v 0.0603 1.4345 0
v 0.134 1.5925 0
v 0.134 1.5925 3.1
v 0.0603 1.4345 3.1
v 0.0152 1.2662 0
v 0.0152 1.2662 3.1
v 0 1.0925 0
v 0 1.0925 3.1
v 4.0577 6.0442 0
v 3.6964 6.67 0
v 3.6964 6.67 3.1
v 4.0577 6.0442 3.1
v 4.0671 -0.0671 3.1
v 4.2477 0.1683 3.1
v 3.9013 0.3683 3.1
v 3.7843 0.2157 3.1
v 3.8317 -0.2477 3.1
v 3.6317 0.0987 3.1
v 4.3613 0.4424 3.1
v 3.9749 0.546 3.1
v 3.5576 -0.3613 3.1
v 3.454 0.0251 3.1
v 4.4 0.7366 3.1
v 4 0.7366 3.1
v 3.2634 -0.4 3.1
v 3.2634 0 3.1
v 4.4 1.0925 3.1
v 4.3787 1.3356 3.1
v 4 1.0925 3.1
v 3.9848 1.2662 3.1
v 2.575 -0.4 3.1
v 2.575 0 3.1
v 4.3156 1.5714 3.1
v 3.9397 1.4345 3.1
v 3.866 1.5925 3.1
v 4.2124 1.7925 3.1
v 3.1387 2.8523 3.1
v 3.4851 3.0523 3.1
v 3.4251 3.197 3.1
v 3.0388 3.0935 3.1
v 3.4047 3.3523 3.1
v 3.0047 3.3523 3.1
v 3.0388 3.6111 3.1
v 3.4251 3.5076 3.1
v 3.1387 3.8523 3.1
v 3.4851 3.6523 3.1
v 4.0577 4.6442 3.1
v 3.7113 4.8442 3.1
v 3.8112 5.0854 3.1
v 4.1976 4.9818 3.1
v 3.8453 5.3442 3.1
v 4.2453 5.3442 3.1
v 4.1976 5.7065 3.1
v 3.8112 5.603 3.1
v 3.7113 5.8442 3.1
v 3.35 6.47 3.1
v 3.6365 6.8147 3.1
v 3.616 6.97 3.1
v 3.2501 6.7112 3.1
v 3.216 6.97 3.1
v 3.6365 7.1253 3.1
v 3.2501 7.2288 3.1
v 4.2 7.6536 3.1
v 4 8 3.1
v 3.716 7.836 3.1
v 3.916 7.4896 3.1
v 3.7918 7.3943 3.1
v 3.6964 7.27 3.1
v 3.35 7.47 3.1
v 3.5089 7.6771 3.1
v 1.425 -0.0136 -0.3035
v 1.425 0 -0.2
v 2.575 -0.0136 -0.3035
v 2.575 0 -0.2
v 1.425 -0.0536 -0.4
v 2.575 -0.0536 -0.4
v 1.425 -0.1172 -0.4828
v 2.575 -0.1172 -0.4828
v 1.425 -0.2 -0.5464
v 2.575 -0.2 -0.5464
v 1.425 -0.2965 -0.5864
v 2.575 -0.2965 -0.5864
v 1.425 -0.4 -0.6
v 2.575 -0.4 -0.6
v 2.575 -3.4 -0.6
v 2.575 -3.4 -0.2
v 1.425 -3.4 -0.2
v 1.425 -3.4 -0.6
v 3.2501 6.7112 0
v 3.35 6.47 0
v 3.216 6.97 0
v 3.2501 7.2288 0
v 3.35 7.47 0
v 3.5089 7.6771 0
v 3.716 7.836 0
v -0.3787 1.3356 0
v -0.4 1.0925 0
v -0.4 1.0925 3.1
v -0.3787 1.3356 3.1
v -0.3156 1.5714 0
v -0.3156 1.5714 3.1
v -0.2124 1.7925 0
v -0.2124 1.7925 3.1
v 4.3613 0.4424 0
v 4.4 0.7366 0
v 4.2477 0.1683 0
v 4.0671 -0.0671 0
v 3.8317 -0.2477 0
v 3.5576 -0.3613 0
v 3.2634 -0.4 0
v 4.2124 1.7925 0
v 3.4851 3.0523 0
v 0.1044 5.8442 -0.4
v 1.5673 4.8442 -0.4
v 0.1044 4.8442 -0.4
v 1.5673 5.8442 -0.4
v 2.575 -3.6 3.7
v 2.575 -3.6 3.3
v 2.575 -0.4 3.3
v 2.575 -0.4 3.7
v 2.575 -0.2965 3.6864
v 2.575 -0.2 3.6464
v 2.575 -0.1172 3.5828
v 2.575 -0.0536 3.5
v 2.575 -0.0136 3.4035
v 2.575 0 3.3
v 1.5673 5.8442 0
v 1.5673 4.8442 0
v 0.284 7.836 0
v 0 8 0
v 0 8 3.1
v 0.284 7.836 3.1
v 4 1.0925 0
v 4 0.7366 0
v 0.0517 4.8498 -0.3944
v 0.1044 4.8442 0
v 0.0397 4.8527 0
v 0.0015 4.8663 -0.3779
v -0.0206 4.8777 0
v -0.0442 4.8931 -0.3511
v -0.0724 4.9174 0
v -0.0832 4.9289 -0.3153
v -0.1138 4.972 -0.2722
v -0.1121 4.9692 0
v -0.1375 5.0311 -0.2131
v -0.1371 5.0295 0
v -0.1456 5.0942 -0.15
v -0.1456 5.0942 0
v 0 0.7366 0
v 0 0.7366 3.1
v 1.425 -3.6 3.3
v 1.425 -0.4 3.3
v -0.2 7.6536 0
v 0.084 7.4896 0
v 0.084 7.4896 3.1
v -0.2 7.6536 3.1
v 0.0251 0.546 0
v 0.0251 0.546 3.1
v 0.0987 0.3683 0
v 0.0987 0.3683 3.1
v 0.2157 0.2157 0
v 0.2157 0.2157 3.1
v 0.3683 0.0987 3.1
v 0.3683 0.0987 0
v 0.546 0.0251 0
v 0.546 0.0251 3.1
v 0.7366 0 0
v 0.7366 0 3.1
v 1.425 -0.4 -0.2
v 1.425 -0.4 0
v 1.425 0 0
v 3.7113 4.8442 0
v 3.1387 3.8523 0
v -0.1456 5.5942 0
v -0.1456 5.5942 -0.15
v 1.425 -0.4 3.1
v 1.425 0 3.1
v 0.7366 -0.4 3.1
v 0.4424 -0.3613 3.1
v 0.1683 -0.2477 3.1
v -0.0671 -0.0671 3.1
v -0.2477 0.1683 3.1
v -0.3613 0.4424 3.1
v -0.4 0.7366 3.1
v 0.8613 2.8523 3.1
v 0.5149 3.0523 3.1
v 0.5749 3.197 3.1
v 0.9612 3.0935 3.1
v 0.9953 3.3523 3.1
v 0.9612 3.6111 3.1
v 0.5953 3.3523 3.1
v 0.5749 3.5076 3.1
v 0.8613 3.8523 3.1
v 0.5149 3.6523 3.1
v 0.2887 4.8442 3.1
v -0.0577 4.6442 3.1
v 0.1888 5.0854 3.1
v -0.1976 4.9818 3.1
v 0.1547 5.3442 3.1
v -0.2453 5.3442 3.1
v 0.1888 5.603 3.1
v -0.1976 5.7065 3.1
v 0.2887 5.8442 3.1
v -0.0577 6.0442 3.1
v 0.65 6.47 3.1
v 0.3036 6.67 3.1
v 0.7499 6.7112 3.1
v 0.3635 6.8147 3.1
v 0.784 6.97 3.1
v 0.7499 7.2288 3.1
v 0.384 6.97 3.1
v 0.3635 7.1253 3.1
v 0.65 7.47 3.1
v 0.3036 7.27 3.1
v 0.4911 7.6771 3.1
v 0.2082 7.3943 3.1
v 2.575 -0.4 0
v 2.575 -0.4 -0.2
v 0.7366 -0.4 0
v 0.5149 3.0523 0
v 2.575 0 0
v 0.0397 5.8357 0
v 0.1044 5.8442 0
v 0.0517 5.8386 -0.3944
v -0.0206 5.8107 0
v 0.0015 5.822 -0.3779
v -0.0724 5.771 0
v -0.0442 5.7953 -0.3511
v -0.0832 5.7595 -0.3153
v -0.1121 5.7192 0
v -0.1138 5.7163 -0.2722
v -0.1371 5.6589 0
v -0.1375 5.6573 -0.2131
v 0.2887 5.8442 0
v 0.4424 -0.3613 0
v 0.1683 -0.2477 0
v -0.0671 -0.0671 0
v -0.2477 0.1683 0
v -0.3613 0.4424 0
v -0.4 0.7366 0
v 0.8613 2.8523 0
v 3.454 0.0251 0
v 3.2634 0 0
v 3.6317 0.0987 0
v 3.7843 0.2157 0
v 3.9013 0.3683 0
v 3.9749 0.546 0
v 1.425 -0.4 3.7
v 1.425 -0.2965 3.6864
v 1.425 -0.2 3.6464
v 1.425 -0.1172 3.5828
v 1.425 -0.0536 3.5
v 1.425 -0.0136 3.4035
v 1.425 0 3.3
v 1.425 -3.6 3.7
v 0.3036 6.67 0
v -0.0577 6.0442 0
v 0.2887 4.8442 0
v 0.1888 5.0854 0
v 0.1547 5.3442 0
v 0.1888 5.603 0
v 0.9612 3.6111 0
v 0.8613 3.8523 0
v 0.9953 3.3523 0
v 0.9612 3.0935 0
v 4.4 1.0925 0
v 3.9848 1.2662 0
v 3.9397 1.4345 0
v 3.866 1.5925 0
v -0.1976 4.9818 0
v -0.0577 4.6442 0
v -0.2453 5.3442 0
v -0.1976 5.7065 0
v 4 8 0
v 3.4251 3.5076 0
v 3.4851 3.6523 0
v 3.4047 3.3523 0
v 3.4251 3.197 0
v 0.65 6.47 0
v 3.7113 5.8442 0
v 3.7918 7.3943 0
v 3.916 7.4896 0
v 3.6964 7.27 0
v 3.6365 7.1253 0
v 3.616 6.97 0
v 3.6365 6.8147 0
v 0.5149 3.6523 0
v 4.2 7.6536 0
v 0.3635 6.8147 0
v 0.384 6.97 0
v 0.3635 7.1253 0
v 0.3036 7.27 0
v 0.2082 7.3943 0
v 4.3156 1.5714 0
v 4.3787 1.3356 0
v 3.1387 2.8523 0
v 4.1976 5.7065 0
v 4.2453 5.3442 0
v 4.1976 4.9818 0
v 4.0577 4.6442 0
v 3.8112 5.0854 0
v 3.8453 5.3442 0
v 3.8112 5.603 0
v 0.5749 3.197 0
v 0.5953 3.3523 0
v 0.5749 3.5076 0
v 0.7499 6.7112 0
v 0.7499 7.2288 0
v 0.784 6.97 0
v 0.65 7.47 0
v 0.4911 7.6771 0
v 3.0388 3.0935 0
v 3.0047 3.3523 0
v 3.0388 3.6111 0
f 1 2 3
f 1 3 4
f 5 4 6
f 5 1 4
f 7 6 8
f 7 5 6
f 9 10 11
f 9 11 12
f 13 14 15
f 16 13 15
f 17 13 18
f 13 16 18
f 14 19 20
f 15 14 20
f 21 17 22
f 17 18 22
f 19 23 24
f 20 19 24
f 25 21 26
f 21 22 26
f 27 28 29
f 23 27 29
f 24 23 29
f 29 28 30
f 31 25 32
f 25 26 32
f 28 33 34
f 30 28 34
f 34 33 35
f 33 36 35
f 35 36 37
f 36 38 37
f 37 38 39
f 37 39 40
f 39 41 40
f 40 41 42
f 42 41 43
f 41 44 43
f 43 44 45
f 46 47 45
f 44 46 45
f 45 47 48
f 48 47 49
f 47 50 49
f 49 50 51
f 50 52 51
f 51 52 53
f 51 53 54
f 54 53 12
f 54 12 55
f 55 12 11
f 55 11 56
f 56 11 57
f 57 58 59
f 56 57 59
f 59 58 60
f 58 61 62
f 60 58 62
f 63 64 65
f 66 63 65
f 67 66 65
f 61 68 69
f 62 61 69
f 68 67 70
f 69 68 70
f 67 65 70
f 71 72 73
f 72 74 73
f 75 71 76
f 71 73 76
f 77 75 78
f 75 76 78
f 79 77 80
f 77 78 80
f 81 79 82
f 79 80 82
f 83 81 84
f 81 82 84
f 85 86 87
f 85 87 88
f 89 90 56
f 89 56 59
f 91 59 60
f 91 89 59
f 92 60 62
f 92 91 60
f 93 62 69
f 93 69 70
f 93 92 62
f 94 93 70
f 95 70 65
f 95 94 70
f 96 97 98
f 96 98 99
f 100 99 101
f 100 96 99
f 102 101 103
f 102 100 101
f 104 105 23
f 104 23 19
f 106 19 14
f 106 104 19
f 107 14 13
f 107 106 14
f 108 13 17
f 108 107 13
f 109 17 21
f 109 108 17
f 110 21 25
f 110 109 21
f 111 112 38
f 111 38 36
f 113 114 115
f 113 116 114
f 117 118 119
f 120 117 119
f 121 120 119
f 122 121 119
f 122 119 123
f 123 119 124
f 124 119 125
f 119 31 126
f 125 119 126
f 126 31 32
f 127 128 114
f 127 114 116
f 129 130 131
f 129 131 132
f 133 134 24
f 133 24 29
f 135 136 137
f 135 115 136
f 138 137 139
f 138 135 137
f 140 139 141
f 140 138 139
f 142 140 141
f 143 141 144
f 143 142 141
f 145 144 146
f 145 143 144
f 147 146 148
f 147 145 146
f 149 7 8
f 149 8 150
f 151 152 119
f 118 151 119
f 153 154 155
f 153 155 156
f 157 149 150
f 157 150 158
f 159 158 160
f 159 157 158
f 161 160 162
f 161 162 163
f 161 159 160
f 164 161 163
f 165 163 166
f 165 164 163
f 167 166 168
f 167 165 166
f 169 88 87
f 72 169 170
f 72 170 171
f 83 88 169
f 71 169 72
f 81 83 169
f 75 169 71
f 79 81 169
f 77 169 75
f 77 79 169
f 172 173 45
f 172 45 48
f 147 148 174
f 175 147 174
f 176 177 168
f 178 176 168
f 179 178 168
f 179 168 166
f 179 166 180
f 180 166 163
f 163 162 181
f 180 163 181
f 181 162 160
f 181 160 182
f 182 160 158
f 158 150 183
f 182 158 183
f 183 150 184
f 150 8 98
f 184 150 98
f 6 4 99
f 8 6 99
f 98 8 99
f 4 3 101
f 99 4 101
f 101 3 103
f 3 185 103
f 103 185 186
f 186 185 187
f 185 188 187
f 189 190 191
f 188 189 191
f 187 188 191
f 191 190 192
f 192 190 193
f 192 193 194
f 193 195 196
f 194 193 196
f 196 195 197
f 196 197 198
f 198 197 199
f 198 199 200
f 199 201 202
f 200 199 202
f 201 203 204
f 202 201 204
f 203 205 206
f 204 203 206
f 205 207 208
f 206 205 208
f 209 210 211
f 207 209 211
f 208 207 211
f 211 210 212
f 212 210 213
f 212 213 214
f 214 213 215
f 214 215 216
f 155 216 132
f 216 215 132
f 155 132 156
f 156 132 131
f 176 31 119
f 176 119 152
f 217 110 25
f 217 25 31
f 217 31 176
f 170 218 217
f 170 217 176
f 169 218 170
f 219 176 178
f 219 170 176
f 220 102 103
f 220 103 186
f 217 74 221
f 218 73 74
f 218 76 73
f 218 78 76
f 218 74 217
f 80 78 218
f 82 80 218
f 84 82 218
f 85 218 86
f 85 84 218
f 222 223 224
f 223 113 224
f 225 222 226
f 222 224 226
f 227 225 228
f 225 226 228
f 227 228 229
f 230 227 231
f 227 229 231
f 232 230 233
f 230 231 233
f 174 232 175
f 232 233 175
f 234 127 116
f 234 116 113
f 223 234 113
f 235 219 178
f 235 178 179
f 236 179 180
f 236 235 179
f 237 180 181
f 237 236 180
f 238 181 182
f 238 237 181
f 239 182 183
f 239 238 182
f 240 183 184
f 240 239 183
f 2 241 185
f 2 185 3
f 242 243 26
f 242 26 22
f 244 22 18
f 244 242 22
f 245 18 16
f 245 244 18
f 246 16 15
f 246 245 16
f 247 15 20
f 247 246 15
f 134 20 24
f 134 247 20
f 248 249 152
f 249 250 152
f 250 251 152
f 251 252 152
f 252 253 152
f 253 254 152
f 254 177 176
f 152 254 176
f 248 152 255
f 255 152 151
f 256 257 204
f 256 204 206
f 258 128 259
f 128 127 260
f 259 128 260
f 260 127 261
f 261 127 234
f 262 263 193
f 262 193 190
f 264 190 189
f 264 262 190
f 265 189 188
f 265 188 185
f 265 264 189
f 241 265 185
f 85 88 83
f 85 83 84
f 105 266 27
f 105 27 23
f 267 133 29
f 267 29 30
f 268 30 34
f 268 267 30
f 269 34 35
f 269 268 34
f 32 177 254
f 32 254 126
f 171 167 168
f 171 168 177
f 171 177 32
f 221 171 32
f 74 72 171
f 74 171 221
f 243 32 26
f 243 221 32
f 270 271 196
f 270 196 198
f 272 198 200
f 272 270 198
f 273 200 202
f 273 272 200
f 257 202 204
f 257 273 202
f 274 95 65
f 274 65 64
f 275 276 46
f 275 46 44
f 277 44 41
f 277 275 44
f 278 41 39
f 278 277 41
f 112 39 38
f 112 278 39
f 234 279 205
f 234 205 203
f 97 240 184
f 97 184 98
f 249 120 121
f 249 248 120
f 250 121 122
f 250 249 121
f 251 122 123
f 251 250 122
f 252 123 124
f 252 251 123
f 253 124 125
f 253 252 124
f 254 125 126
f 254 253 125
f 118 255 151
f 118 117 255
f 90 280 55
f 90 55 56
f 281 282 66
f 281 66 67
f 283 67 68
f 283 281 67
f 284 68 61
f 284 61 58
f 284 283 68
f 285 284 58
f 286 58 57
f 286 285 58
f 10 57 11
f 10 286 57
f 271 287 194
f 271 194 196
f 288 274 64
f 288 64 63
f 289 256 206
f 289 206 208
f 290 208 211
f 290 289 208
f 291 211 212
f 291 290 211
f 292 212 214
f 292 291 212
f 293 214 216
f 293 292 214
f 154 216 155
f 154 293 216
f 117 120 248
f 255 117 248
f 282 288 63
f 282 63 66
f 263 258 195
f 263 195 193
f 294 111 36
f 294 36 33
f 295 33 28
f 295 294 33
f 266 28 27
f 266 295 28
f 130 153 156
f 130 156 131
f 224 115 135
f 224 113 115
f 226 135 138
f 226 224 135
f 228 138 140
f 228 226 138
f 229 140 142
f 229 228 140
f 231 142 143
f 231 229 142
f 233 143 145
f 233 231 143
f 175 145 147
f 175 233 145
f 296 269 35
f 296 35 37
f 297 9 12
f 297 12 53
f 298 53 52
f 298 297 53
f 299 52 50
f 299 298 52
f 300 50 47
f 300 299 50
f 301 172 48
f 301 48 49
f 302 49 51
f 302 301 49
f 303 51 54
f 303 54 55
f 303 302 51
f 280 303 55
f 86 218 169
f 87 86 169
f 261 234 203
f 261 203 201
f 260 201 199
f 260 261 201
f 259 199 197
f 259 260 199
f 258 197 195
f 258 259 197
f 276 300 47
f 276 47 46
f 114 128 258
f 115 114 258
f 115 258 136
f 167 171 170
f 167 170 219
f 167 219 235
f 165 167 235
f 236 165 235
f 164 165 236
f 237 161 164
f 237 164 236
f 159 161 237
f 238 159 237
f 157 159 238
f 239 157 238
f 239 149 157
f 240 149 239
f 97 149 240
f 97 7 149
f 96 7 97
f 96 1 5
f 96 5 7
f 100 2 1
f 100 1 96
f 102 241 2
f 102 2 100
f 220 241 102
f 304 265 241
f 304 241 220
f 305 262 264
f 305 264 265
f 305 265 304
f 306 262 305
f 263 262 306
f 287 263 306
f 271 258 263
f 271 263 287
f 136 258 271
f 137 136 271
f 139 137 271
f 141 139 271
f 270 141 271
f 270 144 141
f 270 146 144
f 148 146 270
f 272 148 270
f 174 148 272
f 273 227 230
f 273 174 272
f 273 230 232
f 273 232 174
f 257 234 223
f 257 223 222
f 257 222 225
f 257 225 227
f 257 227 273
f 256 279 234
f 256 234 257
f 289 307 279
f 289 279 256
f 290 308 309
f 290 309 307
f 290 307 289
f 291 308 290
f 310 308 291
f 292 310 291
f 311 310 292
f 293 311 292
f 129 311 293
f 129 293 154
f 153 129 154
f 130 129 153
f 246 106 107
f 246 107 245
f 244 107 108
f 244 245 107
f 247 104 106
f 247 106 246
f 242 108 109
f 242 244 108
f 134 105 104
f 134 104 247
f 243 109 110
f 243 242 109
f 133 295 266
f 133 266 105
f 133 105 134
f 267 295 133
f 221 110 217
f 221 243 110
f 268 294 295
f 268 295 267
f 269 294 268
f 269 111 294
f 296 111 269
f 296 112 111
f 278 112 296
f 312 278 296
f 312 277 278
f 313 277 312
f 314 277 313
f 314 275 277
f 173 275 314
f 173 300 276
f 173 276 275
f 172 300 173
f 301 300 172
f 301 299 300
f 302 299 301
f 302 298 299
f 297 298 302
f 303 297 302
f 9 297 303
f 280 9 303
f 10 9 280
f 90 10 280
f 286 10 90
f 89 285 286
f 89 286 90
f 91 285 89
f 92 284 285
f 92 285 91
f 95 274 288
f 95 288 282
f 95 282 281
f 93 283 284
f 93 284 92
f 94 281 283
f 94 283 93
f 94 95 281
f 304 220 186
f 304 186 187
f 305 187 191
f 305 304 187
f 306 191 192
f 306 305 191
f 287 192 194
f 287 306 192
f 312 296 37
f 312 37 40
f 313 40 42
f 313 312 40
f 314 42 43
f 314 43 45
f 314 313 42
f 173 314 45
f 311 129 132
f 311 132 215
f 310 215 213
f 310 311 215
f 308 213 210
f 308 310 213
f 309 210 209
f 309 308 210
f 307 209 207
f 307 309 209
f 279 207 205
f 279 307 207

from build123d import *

# Parameters (mm, degrees)
SM_BASE_FLANGE_1_DEPTH = 3.1
SKETCH_11_W            = 1.15
SKETCH_11_H            = 0.4
SKETCH_13_W            = 1.15
SKETCH_13_H            = 0.4
SKETCH_15_W            = 1.712954878
SKETCH_15_H            = 1
EXTRUDE_1_DEPTH        = 0.4
FILLET_1_R             = 0.25


# Sheet-metal steps are written as plain solids
with BuildPart() as part:
    # Sketch 1 → 基体-法兰1 (new body)
    with BuildSketch(Plane.XY):
        with BuildLine():
            Line((0, 8), (0.283974596, 7.83604719))
            ThreePointArc((0.283974596, 7.83604719), (0.749900423, 7.228840832), (0.65, 6.470021787))
            Line((0.65, 6.470021787), (0.288675135, 5.844188762))
            ThreePointArc((0.288675135, 5.844188762), (0.154700538, 5.344188762), (0.288675135, 4.844188762))
            Line((0.288675135, 4.844188762), (0.861324865, 3.852330333))
            ThreePointArc((0.861324865, 3.852330333), (0.995299462, 3.352330333), (0.861324865, 2.852330333))
            Line((0.861324865, 2.852330333), (0.133974596, 1.592522712))
            ThreePointArc((0.133974596, 1.592522712), (0.034074174, 1.351341757), (0, 1.092522712))
            Line((0, 1.092522712), (0, 0.7366))
            ThreePointArc((0, 0.7366), (0.215745145, 0.215745145), (0.7366, 0))
            Line((0.7366, 0), (3.2634, 0))
            ThreePointArc((3.2634, 0), (3.784254855, 0.215745145), (4, 0.7366))
            Line((4, 0.7366), (4, 1.092522712))
            ThreePointArc((4, 1.092522712), (3.965925826, 1.351341757), (3.866025404, 1.592522712))
            Line((3.866025404, 1.592522712), (3.138675135, 2.852330333))
            ThreePointArc((3.138675135, 2.852330333), (3.004700538, 3.352330333), (3.138675135, 3.852330333))
            Line((3.138675135, 3.852330333), (3.711324865, 4.844188762))
            ThreePointArc((3.711324865, 4.844188762), (3.845299462, 5.344188762), (3.711324865, 5.844188762))
            Line((3.711324865, 5.844188762), (3.35, 6.470021787))
            ThreePointArc((3.35, 6.470021787), (3.250099577, 7.228840832), (3.716025404, 7.83604719))
            Line((3.716025404, 7.83604719), (4, 8))
            Line((4, 8), (4.2, 7.653589838))
            Line((4.2, 7.653589838), (3.916025404, 7.489637029))
            ThreePointArc((3.916025404, 7.489637029), (3.636469908, 7.125313214), (3.696410162, 6.670021787))
            Line((3.696410162, 6.670021787), (4.057735027, 6.044188762))
            ThreePointArc((4.057735027, 6.044188762), (4.245299462, 5.344188762), (4.057735027, 4.644188762))
            Line((4.057735027, 4.644188762), (3.485085296, 3.652330333))
            ThreePointArc((3.485085296, 3.652330333), (3.404700538, 3.352330333), (3.485085296, 3.052330333))
            Line((3.485085296, 3.052330333), (4.212435565, 1.792522712))
            ThreePointArc((4.212435565, 1.792522712), (4.352296157, 1.454869375), (4.4, 1.092522712))
            Line((4.4, 1.092522712), (4.4, 0.7366))
            ThreePointArc((4.4, 0.7366), (4.067097567, -0.067097567), (3.2634, -0.4))
            Line((3.2634, -0.4), (0.7366, -0.4))
            ThreePointArc((0.7366, -0.4), (-0.067097567, -0.067097567), (-0.4, 0.7366))
            Line((-0.4, 0.7366), (-0.4, 1.092522712))
            ThreePointArc((-0.4, 1.092522712), (-0.352296157, 1.454869375), (-0.212435565, 1.792522712))
            Line((-0.212435565, 1.792522712), (0.514914704, 3.052330333))
            ThreePointArc((0.514914704, 3.052330333), (0.595299462, 3.352330333), (0.514914704, 3.652330333))
            Line((0.514914704, 3.652330333), (-0.057735027, 4.644188762))
            ThreePointArc((-0.057735027, 4.644188762), (-0.245299462, 5.344188762), (-0.057735027, 6.044188762))
            Line((-0.057735027, 6.044188762), (0.303589838, 6.670021787))
            ThreePointArc((0.303589838, 6.670021787), (0.363530092, 7.125313214), (0.083974596, 7.489637029))
            Line((0.083974596, 7.489637029), (-0.2, 7.653589838))
            Line((-0.2, 7.653589838), (0, 8))
        make_face()
    extrude(amount=SM_BASE_FLANGE_1_DEPTH)

    # 扫描1: sweep along a path in 草图12
    with BuildLine(Plane(origin=(2, 0, 0), x_dir=(0, 0, -1), z_dir=(1, 0, 0))) as sweep_1_path:
        Line((-3.5, -3.6), (-3.5, -0.4))
        ThreePointArc((-3.5, -0.4), (-3.441421356, -0.258578644), (-3.3, -0.2))
        Line((-3.3, -0.2), (-3.1, -0.2))
    # 草图11 → 扫描1 (sweep)
    with BuildSketch(Plane.XY.offset(3.1)):
        with Locations((2, -0.2)):
            Rectangle(SKETCH_11_W, SKETCH_11_H)
    sweep(path=sweep_1_path.line)

    # 扫描2: sweep along a path in 草图14
    with BuildLine(Plane(origin=(2, 0, 0), x_dir=(0, 0, -1), z_dir=(1, 0, 0))) as sweep_2_path:
        Line((0, -0.2), (0.2, -0.2))
        ThreePointArc((0.2, -0.2), (0.341421356, -0.258578644), (0.4, -0.4))
        Line((0.4, -0.4), (0.4, -3.4))
    # 草图13 → 扫描2 (sweep)
    with BuildSketch(Plane(origin=(0, 0, 0), x_dir=(-1, 0, 0), z_dir=(0, 0, -1))):
        with Locations((-2, -0.2)):
            Rectangle(SKETCH_13_W, SKETCH_13_H)
    sweep(path=sweep_2_path.line)

    # 草图15 → 凸台-拉伸1 (add)
    with BuildSketch(Plane(origin=(0, 0, 0), x_dir=(-1, 0, 0), z_dir=(0, 0, -1))):
        with Locations((-0.710838396, 5.344188762)):
            Rectangle(SKETCH_15_W, SKETCH_15_H)
    extrude(amount=EXTRUDE_1_DEPTH)

    # 圆角1
    fillet_1_edges = [part.edges().sort_by_distance(p)[0] for p in [
        (-0.145639043, 4.844188762, -0.2),
        (-0.145639043, 5.844188762, -0.2),
        (-0.145639043, 5.344188762, -0.4),
    ]]
    fillet(fillet_1_edges, radius=FILLET_1_R)


solid = part.part
